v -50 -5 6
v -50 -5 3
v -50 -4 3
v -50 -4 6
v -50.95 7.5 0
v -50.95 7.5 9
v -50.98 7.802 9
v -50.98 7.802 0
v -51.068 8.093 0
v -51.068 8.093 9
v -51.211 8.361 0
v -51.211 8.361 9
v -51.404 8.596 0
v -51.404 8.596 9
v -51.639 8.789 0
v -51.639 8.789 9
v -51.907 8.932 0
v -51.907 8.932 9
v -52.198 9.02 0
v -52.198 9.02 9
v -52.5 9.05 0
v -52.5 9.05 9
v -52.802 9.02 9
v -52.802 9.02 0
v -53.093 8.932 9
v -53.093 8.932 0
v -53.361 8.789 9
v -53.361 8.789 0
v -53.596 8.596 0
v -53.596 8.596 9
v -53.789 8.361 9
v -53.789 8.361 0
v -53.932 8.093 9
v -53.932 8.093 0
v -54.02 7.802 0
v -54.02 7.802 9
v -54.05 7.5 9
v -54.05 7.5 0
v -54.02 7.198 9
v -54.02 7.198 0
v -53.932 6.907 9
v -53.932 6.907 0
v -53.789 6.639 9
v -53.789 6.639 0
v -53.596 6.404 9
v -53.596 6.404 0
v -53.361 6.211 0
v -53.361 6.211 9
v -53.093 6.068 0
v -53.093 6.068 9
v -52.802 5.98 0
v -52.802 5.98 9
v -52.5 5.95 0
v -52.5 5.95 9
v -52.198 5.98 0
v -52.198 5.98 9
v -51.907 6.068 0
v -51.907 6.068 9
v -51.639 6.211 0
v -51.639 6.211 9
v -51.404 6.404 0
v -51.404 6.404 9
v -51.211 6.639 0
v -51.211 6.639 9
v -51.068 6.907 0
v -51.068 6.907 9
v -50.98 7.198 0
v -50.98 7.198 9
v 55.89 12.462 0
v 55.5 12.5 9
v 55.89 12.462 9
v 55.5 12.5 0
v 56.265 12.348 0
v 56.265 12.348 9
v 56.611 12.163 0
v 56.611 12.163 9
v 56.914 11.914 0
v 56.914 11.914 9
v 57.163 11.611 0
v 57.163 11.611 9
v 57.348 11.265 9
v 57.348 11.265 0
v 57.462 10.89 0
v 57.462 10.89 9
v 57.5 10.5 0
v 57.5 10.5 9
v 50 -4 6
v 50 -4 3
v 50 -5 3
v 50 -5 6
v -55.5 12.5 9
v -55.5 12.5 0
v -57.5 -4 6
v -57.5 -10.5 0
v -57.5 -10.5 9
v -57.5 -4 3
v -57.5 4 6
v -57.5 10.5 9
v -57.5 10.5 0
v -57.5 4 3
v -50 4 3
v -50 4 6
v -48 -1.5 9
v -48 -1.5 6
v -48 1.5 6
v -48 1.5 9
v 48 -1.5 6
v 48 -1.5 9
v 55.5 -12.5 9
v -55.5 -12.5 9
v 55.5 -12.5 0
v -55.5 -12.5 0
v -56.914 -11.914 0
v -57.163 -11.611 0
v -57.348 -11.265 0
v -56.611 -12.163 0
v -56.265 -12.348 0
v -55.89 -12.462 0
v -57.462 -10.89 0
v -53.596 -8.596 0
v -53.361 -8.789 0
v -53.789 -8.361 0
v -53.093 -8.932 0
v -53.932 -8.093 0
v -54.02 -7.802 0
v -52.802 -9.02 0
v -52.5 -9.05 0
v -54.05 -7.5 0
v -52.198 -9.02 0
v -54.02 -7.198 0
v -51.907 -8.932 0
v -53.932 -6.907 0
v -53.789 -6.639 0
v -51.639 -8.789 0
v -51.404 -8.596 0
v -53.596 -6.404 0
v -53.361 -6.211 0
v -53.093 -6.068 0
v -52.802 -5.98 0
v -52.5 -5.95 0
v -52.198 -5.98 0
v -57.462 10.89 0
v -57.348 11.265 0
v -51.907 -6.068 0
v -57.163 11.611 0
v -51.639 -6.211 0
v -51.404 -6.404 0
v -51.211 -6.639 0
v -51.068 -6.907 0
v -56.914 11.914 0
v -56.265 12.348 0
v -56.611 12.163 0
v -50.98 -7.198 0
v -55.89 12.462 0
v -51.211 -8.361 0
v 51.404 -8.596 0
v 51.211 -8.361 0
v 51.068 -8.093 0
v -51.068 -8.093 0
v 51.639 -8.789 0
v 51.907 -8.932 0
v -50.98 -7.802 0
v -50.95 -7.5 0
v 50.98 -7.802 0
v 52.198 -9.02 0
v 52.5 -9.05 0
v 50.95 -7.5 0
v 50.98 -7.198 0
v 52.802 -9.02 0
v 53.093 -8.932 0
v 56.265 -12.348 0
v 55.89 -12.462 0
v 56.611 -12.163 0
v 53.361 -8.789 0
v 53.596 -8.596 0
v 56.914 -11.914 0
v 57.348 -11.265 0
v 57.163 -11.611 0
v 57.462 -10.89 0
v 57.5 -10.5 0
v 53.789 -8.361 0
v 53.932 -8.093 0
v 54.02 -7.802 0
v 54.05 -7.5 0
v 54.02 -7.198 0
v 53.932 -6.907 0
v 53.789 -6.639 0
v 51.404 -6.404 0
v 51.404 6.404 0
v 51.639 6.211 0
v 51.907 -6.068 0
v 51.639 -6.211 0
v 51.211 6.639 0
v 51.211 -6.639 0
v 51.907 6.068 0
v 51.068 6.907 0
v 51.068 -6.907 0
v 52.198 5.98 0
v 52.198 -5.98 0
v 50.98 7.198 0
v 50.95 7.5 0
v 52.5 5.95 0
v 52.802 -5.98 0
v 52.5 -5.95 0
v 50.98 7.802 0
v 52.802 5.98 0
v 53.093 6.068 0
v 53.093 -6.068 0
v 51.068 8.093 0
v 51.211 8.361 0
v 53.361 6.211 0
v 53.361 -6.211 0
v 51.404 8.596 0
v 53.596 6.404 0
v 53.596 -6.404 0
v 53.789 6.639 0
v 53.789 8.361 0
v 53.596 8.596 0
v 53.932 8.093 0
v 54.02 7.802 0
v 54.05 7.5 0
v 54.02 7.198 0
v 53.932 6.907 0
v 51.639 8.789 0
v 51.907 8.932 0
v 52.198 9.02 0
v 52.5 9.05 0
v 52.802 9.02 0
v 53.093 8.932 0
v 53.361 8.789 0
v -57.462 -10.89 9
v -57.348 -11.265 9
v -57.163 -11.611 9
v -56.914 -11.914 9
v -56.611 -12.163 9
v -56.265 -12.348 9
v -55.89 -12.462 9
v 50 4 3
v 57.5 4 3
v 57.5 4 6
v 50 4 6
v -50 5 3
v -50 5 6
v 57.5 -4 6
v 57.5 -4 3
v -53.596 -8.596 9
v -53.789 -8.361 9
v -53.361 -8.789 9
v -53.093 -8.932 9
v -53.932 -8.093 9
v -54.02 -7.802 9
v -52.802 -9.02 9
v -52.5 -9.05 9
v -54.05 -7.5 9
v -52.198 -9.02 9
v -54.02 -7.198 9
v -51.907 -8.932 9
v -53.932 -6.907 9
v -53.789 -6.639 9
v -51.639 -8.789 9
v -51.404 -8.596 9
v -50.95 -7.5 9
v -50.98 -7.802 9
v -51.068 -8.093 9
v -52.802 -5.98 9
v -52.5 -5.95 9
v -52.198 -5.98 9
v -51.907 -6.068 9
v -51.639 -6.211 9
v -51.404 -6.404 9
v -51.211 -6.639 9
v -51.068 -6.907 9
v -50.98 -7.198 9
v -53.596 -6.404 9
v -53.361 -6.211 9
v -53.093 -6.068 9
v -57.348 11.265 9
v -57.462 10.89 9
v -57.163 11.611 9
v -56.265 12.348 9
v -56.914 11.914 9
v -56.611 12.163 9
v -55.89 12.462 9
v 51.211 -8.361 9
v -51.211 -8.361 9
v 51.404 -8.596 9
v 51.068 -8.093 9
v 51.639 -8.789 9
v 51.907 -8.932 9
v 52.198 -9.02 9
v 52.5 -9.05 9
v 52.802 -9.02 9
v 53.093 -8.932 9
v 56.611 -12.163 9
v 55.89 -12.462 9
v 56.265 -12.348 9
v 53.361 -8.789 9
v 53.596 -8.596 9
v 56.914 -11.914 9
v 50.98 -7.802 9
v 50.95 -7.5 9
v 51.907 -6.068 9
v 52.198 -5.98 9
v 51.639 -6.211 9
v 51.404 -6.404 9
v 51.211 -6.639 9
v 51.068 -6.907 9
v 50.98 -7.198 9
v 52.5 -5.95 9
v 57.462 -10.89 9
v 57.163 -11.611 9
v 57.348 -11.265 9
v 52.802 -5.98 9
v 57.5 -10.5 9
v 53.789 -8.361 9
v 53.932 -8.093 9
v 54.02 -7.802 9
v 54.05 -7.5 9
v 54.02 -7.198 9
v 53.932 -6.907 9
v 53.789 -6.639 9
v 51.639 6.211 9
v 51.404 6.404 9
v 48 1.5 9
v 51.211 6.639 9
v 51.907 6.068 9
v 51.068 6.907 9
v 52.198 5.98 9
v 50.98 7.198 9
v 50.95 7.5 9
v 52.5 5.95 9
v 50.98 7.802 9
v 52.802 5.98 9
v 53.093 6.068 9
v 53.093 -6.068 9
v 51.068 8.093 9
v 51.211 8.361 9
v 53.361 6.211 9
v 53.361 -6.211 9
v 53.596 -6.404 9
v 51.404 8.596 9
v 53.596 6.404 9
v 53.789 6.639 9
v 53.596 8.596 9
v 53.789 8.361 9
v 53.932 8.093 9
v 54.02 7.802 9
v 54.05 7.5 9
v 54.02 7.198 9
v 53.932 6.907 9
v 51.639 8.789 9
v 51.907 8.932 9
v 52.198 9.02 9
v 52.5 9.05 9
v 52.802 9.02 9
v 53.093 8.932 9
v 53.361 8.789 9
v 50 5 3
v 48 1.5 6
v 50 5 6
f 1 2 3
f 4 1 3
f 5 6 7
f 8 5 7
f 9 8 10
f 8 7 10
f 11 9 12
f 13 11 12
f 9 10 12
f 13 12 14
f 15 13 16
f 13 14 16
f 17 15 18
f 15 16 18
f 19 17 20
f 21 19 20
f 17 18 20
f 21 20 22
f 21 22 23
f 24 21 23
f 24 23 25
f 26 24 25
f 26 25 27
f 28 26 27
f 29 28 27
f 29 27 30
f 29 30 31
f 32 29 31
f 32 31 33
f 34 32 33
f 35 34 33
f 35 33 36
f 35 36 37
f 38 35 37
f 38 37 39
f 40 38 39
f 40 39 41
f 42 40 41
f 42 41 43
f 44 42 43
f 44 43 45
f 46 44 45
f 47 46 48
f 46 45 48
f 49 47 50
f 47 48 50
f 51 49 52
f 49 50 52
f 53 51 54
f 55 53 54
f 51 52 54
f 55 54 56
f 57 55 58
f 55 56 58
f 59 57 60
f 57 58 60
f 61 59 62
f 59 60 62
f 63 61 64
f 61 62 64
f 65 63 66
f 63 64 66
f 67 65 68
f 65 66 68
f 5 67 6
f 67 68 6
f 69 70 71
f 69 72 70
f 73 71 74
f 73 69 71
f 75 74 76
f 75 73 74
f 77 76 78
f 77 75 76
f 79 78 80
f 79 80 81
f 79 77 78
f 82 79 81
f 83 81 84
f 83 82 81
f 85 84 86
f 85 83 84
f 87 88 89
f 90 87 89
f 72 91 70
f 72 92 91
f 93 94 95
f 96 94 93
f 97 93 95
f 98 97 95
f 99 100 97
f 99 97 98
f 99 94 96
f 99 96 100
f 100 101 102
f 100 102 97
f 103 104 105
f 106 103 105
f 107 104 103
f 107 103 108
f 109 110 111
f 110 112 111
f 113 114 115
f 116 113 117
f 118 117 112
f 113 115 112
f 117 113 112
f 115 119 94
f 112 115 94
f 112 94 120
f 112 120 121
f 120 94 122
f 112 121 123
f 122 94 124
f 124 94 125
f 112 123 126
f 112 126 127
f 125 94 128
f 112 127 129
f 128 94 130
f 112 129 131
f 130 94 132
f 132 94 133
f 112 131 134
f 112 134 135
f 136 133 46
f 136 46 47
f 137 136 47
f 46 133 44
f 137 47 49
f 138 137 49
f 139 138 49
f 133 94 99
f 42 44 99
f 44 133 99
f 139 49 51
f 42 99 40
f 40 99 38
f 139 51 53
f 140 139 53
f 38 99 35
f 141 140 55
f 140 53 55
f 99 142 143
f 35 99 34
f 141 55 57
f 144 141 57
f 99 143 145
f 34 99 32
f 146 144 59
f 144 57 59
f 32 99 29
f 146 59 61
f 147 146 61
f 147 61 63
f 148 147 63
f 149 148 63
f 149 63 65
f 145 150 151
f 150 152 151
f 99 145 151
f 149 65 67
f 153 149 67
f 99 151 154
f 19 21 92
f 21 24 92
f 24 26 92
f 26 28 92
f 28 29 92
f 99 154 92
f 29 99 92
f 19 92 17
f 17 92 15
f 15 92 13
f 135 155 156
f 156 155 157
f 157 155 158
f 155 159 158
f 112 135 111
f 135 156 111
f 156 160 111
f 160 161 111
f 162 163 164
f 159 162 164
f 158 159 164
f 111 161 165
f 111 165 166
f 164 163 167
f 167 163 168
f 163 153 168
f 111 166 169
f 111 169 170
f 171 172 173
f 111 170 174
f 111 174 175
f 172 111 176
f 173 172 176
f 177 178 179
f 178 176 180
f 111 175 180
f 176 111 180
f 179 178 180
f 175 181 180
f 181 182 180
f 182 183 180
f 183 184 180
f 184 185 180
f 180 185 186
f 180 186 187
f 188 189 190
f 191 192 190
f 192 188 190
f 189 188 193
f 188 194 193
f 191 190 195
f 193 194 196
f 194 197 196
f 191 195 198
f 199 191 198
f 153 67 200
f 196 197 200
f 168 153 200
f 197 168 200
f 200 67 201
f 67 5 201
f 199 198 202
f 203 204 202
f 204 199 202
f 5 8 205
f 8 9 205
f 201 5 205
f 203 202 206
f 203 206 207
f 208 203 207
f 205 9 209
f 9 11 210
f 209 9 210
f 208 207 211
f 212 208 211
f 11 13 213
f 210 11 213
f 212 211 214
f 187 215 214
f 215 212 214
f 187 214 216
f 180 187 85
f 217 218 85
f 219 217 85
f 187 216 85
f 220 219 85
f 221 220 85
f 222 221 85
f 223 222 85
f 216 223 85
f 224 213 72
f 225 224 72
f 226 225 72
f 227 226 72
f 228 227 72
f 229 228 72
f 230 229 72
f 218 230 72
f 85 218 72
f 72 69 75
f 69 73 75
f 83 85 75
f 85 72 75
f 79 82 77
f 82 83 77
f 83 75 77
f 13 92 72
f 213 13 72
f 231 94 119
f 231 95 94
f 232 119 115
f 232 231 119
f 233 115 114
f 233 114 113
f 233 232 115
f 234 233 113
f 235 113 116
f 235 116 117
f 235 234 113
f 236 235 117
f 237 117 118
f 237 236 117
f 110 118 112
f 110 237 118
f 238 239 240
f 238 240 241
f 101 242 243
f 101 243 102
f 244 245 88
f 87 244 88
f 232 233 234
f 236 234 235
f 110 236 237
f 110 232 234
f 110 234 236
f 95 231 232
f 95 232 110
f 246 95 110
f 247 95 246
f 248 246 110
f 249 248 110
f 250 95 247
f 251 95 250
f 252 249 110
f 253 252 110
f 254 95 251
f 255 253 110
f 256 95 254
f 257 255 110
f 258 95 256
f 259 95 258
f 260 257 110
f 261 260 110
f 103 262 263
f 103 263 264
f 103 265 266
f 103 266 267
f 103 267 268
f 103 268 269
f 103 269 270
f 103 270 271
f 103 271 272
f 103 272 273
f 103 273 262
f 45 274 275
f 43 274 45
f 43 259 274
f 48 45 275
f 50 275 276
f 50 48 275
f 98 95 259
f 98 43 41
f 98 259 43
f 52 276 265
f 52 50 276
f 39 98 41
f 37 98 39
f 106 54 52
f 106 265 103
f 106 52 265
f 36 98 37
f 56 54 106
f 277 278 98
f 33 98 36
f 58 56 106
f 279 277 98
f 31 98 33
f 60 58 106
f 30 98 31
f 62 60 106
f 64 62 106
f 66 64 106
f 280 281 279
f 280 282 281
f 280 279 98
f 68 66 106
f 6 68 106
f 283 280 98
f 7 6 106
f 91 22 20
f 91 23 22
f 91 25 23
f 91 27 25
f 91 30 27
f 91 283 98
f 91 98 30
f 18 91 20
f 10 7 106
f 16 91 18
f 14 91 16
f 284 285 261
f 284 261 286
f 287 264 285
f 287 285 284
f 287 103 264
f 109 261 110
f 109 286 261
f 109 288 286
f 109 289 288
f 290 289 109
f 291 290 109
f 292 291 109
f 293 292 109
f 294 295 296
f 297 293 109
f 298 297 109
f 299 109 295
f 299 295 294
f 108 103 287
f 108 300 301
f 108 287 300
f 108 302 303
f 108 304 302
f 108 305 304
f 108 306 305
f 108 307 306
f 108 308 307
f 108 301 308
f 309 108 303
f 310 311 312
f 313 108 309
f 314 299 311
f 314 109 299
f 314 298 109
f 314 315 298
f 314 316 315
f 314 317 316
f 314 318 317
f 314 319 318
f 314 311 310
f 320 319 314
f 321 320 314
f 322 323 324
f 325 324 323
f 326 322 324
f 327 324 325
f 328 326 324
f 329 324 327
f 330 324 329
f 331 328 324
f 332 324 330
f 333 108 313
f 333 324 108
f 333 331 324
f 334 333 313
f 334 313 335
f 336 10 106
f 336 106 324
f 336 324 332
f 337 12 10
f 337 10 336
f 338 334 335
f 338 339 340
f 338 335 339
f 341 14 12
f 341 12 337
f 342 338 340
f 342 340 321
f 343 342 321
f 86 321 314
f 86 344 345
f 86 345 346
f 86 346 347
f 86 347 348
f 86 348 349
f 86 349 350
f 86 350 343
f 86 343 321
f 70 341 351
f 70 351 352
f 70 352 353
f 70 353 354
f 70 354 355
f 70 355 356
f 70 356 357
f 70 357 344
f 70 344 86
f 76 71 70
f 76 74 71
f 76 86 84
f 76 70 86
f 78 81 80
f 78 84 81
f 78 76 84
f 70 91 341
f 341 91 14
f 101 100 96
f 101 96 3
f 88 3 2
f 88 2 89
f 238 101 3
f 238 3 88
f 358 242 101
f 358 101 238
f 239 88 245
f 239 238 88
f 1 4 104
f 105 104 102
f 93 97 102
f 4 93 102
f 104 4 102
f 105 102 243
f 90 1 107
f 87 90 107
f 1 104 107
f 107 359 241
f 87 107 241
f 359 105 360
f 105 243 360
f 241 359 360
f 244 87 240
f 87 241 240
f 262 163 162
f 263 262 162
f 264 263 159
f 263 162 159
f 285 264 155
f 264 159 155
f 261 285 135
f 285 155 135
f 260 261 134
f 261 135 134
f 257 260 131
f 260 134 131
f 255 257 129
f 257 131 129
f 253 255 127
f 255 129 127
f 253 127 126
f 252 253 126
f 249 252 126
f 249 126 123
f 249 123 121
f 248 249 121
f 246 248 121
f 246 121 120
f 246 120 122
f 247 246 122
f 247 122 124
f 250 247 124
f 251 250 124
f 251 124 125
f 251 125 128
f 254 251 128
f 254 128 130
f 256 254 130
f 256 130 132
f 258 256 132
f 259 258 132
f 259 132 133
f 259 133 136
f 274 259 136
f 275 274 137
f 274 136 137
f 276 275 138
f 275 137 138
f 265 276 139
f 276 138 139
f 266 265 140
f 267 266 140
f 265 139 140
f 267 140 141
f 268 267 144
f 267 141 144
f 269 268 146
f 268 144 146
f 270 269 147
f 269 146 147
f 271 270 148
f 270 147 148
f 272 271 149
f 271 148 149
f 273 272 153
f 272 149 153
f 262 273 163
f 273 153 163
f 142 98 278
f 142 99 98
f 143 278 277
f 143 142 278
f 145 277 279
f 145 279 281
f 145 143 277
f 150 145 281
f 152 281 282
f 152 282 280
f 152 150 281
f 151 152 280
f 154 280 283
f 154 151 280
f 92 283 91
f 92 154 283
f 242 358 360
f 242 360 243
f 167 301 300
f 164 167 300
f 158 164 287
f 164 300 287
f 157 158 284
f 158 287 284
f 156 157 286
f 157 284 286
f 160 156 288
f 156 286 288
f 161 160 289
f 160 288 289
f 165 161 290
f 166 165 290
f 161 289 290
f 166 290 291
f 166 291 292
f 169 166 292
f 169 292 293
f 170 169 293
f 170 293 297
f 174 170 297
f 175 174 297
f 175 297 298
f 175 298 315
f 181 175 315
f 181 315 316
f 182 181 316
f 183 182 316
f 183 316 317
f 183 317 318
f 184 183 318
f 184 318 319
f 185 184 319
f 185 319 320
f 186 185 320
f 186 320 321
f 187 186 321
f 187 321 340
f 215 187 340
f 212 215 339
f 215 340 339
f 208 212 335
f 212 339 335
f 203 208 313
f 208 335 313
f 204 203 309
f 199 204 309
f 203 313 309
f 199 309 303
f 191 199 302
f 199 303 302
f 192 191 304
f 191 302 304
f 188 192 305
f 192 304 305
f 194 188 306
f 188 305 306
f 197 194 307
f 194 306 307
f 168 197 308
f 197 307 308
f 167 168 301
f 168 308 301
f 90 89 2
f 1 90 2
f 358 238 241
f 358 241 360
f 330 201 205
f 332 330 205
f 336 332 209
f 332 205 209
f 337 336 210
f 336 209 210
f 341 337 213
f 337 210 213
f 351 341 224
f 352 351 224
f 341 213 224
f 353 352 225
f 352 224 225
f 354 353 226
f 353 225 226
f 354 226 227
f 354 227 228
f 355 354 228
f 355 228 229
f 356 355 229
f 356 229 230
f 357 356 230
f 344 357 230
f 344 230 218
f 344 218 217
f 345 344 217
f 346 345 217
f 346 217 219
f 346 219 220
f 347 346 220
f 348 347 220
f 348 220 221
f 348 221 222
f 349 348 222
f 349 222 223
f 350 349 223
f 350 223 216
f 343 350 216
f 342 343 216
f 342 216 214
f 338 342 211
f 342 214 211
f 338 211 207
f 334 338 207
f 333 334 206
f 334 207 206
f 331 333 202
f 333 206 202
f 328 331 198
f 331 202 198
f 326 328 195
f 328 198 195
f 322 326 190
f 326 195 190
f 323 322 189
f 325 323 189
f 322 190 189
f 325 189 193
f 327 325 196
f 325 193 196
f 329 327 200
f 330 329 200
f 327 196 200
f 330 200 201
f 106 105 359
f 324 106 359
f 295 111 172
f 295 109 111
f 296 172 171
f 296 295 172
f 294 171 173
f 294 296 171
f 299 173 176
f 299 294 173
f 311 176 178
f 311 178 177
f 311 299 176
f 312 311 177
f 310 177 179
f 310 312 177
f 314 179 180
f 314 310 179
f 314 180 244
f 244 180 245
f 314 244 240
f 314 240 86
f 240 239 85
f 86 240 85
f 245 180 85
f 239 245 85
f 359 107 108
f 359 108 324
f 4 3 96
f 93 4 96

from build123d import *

# Parameters (mm, degrees)
SKETCH_W              = 115
SKETCH_H              = 25
PAD_DEPTH             = 3
PAD001_DEPTH          = 3
SKETCH002_W           = 115
SKETCH002_H           = 25
SKETCH002_W_2         = 96
SKETCH002_H_2         = 3
PAD002_DEPTH          = 3
SKETCH003_R           = 1.55
POCKET_DEPTH          = 245.060315
POLARPATTERN_COUNT    = 2
POLARPATTERN001_COUNT = 2
POLARPATTERN002_COUNT = 2
FILLET_R              = 2


with BuildPart() as part:
    # Sketch → Pad (new body)
    with BuildSketch(Plane.XY):
        Rectangle(SKETCH_W, SKETCH_H)
    extrude(amount=PAD_DEPTH)

    # Sketch001 (on Face6 of Pad) → Pad001 (join)
    with BuildSketch(Plane.XY.offset(3)):
        Polygon((-57.5, 12.5), (57.5, 12.5), (57.5, 4), (50, 4), (50, 5), (-50, 5), (-50, 4), (-57.5, 4), align=None)
        Polygon((-57.5, -12.5), (57.5, -12.5), (57.5, -4), (50, -4), (50, -5), (-50, -5), (-50, -4), (-57.5, -4), align=None)
    extrude(amount=PAD001_DEPTH)

    # Sketch002 (on Face12 of Pad001) → Pad002 (join)
    with BuildSketch(Plane.XY.offset(6)):
        Rectangle(SKETCH002_W, SKETCH002_H)
        Rectangle(SKETCH002_W_2, SKETCH002_H_2, mode=Mode.SUBTRACT)
    extrude(amount=PAD002_DEPTH)

    # Sketch003 (on Face26 of Pad002) → Pocket (cut, through all)
    with BuildSketch(Plane.XY.offset(9)):
        with Locations((-52.5, 7.5)):
            Circle(SKETCH003_R)
    pocket = extrude(amount=-POCKET_DEPTH, mode=Mode.SUBTRACT)

    # PolarPattern: Pocket ×2 about axis
    polarpattern_axis = Axis((0, 0, 0), (0, 1, 0))
    for i in range(1, POLARPATTERN_COUNT):
        add(pocket.rotate(polarpattern_axis, i * 360 / POLARPATTERN_COUNT), mode=Mode.SUBTRACT)

    # PolarPattern001: Pocket ×2 about axis
    polarpattern001_axis = Axis((0, 0, 0), (1, 0, 0))
    for i in range(1, POLARPATTERN001_COUNT):
        add(pocket.rotate(polarpattern001_axis, i * 360 / POLARPATTERN001_COUNT), mode=Mode.SUBTRACT)

    # PolarPattern002: Pocket ×2 about axis
    polarpattern002_axis = Axis((0, 0, 9), (0, 0, 1))
    for i in range(1, POLARPATTERN002_COUNT):
        add(pocket.rotate(polarpattern002_axis, i * 360 / POLARPATTERN002_COUNT), mode=Mode.SUBTRACT)

    # Fillet
    fillet_edges = [part.edges().sort_by_distance(p)[0] for p in [
        (57.5, 12.5, 7.5),
        (57.5, 12.5, 4.5),
        (57.5, 12.5, 1.5),
        (57.5, -12.5, 7.5),
        (-57.5, 12.5, 7.5),
        (-57.5, -12.5, 7.5),
    ]]
    fillet(fillet_edges, radius=FILLET_R)


solid = part.part
